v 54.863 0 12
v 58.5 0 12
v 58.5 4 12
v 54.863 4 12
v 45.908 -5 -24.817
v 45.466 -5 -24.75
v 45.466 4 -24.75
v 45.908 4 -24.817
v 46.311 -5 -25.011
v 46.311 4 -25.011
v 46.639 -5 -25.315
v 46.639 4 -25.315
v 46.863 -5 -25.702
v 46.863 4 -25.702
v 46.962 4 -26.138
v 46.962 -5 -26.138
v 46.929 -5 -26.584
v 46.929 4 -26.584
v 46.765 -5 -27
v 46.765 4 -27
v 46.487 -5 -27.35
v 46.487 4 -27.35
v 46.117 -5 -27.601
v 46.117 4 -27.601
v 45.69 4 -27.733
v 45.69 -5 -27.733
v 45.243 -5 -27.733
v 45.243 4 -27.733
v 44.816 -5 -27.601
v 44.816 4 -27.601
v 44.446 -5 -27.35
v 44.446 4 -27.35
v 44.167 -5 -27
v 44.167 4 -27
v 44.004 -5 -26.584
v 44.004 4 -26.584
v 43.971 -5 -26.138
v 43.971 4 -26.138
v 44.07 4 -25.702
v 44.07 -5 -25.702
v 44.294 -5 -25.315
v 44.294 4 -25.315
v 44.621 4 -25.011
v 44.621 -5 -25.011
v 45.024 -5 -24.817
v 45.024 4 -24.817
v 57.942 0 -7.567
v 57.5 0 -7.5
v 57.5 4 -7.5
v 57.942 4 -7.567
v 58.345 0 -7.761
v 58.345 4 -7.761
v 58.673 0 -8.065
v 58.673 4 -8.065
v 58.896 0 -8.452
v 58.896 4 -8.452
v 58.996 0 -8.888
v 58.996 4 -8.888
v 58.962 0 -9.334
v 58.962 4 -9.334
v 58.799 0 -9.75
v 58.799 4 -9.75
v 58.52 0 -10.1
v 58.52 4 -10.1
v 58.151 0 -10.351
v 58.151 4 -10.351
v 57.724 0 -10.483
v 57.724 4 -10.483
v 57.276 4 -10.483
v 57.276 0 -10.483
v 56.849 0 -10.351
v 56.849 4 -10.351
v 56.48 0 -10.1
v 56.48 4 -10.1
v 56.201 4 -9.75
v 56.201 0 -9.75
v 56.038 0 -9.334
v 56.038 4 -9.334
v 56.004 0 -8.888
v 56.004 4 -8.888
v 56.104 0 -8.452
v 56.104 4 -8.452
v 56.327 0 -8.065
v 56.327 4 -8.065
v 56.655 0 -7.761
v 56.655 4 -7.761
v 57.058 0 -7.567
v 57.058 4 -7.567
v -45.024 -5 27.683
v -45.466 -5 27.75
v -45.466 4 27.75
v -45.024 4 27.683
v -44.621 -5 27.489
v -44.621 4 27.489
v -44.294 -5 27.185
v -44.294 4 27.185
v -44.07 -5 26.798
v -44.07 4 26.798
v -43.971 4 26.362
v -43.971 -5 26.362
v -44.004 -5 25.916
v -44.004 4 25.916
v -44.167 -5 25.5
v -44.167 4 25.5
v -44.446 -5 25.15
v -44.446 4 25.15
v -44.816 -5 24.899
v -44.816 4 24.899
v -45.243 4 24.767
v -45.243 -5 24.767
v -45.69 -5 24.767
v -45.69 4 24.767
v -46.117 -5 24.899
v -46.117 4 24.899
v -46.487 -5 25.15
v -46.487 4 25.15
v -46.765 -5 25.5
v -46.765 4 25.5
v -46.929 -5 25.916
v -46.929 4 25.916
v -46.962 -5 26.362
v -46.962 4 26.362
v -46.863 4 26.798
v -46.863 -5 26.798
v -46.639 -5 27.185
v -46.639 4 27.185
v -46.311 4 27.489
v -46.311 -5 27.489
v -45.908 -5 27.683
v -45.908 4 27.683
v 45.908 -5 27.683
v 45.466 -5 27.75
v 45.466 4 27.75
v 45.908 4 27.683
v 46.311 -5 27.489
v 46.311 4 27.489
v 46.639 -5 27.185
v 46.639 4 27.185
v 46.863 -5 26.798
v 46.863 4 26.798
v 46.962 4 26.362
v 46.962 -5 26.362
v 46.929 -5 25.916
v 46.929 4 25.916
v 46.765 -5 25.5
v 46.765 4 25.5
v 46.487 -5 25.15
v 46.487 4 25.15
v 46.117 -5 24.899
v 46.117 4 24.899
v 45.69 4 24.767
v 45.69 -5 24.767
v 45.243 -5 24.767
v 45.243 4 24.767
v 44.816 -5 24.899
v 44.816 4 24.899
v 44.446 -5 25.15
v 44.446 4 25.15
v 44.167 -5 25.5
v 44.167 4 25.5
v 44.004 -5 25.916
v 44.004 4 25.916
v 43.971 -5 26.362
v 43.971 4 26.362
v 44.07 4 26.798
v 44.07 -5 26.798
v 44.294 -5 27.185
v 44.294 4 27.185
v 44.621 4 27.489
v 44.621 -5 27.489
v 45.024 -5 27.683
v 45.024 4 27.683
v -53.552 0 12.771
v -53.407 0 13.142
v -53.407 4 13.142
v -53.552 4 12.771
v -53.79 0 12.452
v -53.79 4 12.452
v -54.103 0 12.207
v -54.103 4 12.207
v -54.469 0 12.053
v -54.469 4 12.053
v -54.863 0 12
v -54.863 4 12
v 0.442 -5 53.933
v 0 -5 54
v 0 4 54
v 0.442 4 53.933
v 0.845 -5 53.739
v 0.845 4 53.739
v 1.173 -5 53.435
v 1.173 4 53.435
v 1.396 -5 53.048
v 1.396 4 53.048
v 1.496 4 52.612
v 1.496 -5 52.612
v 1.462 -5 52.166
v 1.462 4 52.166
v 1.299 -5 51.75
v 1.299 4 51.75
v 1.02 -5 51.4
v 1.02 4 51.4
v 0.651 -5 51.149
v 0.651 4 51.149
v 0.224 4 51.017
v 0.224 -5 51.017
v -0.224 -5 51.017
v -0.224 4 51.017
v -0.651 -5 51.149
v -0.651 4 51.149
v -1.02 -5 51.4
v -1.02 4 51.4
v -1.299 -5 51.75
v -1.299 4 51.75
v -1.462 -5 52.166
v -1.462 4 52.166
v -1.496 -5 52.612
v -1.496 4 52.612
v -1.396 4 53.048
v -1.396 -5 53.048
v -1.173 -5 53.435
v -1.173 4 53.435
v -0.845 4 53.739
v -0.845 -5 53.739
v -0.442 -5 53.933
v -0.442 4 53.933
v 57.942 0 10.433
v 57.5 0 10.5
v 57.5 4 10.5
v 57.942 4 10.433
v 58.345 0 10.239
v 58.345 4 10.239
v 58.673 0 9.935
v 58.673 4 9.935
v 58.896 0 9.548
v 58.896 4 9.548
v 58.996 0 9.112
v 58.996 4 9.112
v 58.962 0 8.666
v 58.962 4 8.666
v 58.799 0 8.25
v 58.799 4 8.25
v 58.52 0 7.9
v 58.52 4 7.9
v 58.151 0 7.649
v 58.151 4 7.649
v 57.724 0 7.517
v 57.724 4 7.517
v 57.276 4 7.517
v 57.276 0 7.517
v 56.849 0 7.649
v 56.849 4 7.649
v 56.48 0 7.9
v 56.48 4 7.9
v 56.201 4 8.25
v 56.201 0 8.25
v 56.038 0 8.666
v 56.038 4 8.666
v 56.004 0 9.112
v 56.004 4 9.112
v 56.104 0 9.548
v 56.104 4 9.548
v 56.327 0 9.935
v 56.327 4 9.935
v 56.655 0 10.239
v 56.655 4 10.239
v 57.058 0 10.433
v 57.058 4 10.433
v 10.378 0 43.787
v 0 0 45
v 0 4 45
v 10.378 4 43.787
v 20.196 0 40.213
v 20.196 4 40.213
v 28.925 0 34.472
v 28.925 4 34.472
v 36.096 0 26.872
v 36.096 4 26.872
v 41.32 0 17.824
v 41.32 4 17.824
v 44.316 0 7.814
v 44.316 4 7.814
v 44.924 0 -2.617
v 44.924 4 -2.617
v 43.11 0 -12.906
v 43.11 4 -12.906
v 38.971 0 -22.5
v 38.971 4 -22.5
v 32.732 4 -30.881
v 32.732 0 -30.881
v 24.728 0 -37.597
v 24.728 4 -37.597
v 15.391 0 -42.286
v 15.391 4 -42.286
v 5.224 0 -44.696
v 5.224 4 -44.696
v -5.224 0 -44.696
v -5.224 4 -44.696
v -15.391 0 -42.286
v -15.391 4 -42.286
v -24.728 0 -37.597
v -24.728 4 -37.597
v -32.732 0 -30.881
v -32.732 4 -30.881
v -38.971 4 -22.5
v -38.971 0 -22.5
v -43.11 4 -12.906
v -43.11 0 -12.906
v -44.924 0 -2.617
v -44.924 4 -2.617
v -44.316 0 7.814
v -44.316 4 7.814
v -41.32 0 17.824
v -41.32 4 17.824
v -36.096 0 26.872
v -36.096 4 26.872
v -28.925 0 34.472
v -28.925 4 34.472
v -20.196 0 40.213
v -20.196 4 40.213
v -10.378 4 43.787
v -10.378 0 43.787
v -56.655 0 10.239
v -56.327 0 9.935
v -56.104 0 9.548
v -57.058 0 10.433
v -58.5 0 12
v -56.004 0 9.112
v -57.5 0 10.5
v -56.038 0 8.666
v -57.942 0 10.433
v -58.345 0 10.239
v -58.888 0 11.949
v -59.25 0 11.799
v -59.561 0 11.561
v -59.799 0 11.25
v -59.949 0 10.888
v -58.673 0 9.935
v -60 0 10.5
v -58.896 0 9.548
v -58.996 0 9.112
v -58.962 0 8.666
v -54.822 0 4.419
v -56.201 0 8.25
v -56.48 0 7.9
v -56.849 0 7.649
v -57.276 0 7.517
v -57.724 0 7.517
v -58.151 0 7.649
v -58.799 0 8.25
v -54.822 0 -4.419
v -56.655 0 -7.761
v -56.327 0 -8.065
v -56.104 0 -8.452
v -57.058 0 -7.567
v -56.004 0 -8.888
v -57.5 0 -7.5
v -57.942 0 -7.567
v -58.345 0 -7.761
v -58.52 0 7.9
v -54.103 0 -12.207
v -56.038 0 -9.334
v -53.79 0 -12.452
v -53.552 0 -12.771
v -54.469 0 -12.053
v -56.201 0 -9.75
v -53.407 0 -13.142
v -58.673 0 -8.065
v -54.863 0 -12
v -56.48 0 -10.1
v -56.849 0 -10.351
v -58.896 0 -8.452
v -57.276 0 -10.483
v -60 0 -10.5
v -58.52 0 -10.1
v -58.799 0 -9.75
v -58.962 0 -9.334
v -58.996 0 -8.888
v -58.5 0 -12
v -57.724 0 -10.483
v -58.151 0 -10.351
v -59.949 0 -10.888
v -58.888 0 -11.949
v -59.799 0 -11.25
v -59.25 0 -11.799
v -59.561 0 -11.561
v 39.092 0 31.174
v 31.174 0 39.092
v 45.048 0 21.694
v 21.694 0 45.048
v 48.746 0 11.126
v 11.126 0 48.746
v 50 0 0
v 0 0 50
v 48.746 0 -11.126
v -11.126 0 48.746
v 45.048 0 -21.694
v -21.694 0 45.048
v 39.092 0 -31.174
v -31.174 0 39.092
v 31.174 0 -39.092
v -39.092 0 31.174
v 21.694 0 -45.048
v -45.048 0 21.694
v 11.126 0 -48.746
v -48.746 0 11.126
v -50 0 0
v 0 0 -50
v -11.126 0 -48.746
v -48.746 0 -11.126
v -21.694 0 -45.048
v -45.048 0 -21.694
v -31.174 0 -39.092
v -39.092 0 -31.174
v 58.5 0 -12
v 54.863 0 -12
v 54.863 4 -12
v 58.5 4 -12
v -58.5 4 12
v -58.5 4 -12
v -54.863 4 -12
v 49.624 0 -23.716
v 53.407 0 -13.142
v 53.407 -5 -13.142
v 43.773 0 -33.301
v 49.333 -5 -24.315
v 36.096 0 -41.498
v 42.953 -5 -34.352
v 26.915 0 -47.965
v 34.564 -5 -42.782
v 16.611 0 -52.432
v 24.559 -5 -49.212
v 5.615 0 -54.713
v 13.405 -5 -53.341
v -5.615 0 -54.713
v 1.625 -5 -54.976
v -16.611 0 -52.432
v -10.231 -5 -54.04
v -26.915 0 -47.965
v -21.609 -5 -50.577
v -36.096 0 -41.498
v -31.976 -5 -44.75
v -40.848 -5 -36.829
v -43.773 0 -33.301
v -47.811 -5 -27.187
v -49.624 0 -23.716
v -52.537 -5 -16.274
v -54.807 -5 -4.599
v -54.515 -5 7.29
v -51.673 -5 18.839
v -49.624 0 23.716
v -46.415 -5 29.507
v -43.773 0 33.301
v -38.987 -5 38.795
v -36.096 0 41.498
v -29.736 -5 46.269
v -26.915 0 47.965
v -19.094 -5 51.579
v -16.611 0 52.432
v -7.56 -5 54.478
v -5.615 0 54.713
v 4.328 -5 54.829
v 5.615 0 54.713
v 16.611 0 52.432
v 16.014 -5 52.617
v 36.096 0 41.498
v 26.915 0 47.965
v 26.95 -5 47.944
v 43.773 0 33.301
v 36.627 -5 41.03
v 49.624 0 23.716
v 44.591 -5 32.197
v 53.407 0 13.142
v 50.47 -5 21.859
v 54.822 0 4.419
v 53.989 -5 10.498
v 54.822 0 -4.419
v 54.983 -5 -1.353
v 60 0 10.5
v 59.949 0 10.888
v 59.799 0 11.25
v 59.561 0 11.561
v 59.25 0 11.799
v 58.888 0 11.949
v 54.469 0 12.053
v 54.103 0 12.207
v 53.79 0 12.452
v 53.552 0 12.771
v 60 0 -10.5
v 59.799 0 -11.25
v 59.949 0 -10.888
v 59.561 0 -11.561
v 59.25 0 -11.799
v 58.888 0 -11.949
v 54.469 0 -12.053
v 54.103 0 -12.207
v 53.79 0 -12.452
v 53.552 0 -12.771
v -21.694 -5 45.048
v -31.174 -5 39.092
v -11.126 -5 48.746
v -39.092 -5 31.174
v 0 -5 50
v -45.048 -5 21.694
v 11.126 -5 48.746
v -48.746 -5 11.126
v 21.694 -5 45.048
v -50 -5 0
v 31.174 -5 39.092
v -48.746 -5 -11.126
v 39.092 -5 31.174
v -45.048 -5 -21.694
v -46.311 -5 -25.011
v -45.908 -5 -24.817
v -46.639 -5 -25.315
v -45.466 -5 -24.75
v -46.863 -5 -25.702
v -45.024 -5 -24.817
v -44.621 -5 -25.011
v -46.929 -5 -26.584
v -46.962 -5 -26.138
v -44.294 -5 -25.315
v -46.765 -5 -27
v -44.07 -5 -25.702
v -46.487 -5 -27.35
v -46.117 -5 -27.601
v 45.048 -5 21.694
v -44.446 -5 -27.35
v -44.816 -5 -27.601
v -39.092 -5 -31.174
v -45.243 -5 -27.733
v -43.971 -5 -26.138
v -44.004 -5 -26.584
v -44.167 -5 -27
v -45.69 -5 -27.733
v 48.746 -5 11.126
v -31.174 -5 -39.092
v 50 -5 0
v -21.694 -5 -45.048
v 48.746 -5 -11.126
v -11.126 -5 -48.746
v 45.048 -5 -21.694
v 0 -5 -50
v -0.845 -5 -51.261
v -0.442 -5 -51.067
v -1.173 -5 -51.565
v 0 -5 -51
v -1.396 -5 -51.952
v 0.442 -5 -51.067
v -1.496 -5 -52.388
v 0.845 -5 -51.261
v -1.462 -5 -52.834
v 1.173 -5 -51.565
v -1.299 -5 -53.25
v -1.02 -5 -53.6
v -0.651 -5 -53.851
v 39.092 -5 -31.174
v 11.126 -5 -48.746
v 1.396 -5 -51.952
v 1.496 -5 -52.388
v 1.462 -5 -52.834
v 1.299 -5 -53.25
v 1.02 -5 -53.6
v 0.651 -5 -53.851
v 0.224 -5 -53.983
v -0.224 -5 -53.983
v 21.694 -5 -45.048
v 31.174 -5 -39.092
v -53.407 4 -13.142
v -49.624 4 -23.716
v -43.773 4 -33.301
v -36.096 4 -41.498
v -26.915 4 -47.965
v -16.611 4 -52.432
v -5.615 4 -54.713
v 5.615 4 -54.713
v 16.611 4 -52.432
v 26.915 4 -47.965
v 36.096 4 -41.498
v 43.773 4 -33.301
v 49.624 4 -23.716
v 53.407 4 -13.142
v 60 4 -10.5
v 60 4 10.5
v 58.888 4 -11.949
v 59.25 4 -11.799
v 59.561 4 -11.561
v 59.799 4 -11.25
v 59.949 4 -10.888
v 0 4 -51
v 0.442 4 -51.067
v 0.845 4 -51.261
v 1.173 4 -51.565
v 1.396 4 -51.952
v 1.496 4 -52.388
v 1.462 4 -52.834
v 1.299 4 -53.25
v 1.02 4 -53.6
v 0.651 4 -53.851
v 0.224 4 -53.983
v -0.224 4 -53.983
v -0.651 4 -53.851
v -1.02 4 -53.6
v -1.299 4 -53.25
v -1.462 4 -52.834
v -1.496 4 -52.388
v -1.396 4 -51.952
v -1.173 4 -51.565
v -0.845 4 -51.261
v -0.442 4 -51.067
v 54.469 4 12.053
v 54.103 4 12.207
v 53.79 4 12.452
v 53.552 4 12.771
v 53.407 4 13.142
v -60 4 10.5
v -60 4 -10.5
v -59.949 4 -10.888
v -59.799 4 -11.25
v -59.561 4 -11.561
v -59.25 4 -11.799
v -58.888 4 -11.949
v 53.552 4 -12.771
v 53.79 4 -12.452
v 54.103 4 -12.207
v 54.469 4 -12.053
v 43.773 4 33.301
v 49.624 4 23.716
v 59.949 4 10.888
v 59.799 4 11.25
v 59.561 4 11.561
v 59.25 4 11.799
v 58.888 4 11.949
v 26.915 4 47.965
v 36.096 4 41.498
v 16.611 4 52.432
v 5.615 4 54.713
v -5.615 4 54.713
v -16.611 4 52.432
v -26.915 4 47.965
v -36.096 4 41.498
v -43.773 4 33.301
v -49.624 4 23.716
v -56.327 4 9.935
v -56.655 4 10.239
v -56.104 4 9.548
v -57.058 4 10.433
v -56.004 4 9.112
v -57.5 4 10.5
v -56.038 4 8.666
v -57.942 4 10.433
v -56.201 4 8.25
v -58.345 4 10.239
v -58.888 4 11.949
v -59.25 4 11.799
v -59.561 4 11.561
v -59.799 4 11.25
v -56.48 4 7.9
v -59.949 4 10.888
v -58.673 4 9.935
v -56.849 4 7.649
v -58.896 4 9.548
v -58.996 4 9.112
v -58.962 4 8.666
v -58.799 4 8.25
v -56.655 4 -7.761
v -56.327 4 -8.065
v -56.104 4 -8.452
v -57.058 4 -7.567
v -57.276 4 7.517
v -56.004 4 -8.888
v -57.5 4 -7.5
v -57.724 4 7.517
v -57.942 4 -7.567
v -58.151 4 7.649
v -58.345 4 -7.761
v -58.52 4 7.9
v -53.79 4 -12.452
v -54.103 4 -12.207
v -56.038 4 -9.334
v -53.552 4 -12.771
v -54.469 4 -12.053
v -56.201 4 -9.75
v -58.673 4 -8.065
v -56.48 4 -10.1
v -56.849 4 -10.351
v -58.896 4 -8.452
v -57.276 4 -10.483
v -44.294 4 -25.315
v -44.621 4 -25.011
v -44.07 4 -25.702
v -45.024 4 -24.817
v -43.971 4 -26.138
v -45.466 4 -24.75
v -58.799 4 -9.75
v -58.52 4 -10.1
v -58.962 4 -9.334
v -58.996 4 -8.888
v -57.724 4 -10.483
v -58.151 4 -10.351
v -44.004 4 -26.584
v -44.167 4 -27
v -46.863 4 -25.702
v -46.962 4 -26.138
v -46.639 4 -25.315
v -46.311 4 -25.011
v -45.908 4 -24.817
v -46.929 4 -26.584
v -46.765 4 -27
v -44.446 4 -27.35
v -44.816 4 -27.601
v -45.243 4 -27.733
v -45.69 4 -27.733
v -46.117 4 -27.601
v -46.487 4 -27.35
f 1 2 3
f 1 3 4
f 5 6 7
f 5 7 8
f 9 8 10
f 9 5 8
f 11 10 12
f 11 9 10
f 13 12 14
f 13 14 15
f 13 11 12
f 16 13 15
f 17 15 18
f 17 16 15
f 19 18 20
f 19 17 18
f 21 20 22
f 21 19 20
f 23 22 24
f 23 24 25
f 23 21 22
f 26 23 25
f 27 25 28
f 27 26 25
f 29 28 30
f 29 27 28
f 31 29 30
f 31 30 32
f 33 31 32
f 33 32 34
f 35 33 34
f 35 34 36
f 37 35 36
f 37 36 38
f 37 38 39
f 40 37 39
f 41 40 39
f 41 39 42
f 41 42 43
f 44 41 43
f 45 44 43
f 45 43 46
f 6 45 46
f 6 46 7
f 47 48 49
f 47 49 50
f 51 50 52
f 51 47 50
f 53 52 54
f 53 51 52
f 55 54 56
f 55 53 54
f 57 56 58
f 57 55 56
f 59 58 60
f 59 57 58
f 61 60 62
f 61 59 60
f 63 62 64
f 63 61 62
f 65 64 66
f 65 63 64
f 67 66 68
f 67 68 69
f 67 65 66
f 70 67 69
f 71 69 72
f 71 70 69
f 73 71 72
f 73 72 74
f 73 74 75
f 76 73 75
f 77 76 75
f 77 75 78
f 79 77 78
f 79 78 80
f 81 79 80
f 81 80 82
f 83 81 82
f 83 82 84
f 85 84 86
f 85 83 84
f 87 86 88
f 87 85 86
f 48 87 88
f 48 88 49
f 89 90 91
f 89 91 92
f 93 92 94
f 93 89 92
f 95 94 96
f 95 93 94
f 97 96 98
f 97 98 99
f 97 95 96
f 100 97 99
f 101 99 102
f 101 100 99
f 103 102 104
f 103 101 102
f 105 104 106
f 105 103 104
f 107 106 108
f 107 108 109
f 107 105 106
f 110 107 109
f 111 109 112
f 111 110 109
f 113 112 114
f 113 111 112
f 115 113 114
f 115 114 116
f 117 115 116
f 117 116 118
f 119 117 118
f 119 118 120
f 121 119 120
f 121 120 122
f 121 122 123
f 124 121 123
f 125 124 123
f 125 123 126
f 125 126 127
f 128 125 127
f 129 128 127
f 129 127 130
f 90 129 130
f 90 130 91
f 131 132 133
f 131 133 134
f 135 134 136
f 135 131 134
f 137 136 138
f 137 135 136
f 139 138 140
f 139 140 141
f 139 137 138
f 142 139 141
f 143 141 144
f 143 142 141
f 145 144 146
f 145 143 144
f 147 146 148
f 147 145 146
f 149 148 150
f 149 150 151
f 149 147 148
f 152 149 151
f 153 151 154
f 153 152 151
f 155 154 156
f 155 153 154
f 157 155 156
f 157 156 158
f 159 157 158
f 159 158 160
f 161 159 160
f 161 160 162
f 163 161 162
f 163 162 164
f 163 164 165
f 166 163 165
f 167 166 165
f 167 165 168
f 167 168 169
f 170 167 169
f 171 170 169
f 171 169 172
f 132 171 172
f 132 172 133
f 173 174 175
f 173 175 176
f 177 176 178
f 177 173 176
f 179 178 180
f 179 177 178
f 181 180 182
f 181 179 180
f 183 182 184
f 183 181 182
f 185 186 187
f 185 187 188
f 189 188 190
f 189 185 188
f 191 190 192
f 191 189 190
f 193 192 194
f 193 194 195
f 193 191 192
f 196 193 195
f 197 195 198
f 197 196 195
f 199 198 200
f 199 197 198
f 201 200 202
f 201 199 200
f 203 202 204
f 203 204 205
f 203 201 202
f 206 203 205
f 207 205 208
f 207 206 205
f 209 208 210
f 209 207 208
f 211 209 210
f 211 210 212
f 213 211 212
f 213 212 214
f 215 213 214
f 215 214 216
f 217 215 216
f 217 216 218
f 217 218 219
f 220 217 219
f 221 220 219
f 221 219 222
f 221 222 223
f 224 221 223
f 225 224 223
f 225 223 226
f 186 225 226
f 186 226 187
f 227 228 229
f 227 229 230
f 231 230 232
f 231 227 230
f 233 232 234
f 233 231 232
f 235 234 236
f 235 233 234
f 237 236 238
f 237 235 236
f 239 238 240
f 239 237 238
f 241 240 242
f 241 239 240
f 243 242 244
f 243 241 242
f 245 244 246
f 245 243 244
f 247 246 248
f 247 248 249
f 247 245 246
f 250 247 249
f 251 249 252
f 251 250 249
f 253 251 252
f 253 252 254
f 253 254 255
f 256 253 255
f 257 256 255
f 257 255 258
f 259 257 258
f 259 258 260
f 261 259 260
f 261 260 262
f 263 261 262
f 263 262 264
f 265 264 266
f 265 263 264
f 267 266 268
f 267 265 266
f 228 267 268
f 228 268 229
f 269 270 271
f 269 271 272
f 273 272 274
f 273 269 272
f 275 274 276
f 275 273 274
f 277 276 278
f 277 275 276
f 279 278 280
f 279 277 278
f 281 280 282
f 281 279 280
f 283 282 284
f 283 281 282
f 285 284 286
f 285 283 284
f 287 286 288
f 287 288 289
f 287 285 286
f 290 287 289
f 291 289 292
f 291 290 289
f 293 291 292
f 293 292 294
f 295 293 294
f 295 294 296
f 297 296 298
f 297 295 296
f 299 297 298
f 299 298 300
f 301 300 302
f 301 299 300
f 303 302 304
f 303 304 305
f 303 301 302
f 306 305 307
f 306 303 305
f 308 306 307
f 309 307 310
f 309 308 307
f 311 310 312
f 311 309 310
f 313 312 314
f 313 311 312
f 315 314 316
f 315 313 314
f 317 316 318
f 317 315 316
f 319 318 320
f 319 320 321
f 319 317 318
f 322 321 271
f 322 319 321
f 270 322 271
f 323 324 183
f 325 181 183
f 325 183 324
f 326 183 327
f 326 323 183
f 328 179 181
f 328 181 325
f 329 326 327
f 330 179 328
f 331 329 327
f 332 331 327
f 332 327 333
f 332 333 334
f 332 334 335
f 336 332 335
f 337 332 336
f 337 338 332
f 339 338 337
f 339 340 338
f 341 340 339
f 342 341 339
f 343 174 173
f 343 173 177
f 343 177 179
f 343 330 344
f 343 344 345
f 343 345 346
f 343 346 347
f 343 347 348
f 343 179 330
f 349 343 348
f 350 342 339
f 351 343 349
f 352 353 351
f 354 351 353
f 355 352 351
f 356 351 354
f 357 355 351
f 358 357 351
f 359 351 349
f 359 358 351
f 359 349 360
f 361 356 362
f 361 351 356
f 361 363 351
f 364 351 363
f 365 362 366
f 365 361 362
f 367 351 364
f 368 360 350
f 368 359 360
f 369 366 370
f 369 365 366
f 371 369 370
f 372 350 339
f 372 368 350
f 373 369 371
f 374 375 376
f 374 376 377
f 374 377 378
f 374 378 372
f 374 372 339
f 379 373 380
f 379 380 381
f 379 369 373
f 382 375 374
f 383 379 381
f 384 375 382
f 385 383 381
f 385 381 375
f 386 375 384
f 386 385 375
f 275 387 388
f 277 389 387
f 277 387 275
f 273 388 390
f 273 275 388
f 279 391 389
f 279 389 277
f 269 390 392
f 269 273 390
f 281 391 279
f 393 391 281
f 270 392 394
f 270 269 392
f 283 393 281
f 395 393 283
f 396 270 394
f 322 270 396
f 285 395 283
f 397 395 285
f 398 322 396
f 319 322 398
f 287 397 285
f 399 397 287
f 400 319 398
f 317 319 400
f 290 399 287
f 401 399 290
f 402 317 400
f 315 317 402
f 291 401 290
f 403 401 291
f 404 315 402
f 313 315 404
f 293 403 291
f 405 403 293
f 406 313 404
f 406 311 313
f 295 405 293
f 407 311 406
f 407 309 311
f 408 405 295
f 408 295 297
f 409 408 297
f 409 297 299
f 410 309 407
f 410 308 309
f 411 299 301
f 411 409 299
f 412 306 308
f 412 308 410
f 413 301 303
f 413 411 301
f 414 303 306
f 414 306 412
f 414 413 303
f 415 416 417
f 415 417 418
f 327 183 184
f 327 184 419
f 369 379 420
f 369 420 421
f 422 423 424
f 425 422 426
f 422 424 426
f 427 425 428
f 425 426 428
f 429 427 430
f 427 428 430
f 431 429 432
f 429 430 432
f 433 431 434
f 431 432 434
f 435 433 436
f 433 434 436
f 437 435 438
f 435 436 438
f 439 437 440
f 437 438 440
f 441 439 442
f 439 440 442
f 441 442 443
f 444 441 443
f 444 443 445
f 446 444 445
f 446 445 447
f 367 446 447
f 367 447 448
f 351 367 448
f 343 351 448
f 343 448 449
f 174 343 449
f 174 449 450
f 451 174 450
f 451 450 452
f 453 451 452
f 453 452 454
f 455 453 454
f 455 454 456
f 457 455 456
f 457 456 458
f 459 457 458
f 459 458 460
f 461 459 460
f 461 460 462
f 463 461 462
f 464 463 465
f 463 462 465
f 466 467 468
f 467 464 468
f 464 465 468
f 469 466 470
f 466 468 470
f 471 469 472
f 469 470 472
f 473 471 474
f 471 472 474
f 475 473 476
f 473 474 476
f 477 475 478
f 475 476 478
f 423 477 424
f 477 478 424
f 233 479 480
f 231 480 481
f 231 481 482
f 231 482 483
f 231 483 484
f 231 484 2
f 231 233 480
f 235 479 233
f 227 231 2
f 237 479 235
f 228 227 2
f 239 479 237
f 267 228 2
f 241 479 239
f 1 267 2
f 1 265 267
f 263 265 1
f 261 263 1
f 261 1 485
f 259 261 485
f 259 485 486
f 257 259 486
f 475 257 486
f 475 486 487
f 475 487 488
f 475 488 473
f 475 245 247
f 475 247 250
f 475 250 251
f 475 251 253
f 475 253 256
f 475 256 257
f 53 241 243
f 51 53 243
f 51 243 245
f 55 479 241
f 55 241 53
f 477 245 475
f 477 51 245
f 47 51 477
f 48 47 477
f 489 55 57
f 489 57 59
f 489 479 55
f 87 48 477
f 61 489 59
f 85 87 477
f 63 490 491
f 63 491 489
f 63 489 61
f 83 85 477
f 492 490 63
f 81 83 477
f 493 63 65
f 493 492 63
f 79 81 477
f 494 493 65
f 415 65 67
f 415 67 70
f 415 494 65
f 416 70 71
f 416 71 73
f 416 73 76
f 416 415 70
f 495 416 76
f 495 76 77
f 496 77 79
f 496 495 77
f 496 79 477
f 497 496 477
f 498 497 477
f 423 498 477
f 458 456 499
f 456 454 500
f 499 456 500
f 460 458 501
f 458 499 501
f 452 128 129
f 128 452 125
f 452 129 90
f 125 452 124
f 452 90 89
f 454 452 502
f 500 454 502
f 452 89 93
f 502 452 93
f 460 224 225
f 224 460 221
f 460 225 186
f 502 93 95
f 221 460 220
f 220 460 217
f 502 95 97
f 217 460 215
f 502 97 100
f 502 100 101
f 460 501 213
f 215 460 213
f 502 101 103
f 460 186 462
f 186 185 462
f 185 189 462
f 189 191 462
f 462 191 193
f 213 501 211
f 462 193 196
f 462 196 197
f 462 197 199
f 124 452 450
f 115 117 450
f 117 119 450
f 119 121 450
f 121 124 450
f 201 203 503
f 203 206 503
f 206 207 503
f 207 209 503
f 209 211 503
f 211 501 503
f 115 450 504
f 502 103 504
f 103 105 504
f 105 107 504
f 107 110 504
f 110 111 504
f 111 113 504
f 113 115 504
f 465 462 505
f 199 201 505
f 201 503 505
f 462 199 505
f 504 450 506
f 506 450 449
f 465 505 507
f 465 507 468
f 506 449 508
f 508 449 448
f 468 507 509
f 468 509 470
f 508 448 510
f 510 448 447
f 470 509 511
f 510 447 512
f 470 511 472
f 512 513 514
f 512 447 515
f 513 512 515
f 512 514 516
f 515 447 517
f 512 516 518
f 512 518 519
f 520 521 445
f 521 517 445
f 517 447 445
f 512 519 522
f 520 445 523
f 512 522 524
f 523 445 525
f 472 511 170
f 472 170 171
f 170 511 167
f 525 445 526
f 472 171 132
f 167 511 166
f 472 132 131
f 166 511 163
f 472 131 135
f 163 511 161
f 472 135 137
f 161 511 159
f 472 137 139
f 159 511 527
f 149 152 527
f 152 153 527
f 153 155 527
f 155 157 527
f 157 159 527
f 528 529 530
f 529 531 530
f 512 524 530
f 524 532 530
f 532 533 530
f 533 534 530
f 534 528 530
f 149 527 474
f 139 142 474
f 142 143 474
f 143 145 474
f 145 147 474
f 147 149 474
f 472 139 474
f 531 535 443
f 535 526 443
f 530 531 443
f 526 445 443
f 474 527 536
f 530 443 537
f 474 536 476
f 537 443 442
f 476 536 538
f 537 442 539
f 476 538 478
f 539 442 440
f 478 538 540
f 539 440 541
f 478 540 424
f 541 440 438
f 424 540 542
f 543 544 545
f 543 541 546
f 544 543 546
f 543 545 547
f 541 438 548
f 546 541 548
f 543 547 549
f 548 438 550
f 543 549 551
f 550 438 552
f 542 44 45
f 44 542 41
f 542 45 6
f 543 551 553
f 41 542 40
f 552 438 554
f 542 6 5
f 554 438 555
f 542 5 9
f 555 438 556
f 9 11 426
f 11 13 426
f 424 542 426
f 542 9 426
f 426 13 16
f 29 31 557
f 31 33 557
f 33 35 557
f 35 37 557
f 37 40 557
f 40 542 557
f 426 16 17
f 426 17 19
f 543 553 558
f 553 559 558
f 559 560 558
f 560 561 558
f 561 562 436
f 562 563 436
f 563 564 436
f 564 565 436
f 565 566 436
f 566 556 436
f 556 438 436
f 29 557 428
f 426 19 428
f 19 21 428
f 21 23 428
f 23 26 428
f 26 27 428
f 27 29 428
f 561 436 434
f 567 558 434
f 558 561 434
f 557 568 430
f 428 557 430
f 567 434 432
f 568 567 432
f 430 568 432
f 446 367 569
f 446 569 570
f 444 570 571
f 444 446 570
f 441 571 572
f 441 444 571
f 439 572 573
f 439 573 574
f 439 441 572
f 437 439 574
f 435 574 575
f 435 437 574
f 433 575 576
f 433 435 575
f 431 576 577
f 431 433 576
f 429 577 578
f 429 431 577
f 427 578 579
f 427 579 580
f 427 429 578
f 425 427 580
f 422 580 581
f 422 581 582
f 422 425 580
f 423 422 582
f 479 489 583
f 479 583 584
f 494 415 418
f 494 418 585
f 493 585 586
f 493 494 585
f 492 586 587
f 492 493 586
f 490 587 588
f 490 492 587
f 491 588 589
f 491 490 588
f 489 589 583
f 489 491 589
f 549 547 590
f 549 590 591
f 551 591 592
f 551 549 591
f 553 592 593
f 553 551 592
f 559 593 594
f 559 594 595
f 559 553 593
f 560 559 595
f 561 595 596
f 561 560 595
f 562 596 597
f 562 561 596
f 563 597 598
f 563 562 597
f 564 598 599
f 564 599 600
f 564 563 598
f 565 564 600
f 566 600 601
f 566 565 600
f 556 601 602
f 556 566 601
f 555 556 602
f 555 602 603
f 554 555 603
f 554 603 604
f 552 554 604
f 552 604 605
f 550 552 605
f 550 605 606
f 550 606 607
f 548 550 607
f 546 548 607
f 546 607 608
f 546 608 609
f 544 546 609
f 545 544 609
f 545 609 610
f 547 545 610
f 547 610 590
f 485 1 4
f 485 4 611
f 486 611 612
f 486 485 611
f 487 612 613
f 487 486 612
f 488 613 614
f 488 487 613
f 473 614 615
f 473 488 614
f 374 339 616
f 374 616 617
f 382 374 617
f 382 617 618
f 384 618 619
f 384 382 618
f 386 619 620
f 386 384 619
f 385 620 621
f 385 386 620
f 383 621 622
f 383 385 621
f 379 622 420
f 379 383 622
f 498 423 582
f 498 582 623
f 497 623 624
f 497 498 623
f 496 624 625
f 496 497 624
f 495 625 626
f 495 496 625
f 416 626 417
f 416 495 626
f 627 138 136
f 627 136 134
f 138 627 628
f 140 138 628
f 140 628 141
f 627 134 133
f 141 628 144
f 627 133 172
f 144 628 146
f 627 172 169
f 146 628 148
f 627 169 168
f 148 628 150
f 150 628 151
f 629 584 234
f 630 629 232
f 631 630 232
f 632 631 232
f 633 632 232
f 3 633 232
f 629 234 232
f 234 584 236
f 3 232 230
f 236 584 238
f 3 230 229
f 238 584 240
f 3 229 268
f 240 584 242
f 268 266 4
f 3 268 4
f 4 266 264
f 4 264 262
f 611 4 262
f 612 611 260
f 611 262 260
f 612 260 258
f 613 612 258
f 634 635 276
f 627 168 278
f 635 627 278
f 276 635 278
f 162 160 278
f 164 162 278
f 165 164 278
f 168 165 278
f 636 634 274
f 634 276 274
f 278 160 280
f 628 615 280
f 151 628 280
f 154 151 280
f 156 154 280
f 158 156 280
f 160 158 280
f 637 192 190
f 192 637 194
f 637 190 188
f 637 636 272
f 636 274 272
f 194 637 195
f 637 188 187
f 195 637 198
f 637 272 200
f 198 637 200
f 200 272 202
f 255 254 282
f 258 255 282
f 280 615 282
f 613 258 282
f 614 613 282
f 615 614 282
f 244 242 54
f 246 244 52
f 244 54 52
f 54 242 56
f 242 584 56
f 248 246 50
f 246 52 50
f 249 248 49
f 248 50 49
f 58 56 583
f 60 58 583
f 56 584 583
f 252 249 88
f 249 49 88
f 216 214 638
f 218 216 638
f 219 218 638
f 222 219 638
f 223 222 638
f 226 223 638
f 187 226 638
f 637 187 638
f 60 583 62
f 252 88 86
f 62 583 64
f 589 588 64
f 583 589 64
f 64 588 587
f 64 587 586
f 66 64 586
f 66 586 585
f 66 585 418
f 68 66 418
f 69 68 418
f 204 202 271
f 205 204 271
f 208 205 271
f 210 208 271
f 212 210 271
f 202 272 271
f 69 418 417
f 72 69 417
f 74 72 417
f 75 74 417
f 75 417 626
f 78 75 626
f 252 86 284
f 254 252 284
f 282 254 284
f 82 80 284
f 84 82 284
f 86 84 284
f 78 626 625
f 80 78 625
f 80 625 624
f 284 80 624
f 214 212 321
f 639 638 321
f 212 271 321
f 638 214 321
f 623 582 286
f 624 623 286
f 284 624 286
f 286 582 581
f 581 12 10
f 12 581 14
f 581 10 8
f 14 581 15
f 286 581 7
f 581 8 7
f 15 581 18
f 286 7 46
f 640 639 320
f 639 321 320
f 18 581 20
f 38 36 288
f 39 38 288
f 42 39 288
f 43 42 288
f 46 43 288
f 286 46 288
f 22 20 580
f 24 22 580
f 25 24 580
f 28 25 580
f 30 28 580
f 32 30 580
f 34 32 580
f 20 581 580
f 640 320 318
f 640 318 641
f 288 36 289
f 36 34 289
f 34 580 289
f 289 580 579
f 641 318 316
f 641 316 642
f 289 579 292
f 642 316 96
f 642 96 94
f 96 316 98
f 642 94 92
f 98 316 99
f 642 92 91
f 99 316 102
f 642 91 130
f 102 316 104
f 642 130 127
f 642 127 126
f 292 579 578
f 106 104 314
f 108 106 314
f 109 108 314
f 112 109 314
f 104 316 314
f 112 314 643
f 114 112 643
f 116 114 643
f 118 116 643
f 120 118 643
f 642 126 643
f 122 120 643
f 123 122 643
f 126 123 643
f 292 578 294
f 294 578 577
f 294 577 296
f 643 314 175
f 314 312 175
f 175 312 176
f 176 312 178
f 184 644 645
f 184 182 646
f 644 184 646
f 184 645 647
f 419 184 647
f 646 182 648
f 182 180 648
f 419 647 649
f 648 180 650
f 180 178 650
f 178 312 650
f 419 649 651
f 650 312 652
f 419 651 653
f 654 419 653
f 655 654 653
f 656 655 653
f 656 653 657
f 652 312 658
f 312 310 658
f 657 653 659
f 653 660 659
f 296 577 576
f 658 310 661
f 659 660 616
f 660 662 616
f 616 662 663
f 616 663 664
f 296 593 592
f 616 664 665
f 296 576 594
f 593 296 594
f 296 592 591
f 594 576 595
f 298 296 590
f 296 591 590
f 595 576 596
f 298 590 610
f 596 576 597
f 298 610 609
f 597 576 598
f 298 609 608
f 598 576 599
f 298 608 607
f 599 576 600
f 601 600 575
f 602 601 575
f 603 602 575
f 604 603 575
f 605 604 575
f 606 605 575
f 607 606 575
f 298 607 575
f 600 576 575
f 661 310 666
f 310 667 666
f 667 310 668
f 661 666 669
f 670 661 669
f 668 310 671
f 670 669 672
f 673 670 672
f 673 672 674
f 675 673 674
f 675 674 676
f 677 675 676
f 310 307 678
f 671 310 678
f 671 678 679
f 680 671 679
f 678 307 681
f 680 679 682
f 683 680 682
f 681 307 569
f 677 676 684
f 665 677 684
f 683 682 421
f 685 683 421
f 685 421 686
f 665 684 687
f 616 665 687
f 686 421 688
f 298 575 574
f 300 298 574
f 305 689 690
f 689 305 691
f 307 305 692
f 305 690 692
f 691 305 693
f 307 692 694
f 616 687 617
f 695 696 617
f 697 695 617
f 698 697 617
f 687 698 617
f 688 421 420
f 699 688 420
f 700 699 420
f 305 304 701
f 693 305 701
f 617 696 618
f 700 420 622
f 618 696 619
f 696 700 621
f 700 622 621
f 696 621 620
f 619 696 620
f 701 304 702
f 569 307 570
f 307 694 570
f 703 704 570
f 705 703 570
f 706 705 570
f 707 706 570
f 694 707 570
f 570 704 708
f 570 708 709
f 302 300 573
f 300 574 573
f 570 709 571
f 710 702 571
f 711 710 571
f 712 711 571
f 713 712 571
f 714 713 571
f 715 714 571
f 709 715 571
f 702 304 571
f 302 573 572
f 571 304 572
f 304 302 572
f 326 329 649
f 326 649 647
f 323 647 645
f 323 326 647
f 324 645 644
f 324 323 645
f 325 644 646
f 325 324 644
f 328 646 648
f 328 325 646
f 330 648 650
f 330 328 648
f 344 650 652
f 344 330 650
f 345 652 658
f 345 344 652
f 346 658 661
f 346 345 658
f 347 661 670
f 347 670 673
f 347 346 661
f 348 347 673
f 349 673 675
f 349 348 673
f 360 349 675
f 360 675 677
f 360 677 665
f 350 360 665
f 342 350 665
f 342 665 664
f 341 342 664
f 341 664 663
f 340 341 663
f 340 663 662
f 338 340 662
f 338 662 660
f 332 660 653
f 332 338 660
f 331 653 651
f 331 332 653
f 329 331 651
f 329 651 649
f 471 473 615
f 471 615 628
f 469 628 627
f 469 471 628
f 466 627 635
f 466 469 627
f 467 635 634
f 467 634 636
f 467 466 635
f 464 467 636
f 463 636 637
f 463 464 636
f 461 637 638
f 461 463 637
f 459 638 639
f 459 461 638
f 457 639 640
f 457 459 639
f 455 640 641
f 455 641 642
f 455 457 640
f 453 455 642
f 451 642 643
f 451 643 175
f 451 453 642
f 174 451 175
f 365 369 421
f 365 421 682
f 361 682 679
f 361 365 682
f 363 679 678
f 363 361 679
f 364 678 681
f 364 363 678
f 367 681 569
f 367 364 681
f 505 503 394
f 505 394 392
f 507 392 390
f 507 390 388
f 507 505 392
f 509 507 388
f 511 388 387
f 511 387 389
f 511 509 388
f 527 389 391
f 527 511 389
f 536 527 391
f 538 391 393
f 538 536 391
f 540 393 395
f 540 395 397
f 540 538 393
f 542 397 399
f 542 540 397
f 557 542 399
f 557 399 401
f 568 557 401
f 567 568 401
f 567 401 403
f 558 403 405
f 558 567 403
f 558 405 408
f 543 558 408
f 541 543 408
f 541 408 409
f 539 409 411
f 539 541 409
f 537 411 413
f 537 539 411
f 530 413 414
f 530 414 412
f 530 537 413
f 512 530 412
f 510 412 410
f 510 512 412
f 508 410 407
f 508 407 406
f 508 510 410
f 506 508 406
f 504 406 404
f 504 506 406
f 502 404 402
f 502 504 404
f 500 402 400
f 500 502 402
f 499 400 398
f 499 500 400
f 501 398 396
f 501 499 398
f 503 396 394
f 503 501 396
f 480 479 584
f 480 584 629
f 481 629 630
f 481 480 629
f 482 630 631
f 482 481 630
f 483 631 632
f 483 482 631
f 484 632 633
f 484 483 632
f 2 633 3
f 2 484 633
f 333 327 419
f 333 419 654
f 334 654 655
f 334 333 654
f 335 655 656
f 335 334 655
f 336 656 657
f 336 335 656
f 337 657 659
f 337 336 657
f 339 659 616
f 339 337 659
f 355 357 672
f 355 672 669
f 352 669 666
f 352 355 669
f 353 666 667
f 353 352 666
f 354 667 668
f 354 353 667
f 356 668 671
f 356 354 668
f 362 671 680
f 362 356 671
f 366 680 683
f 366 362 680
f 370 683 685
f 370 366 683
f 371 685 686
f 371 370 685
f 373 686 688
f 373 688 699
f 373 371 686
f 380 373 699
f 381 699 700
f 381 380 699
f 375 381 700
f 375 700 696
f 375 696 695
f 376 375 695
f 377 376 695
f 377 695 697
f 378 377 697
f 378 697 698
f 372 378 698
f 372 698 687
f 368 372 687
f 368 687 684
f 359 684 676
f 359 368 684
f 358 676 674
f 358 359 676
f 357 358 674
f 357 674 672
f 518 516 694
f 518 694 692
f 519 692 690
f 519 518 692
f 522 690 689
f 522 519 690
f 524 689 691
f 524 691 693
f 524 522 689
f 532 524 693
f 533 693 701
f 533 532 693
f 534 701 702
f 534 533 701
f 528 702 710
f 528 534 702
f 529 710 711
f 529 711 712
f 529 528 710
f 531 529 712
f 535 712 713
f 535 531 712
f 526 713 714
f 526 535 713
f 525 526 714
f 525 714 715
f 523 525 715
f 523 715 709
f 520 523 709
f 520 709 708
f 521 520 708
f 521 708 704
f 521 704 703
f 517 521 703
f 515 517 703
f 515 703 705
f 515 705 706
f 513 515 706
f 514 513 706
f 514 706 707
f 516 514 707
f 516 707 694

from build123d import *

# Parameters (mm, degrees)
SKETCH_1_R      = 1.5
SKETCH_1_R_2    = 45
EXTRUDE_1_DEPTH = 4
EXTRUDE_START   = -5
SKETCH_2_R      = 55
SKETCH_2_R_2    = 1.5
SKETCH_2_R_3    = 50
EXTRUDE_2_DEPTH = 5


with BuildPart() as part:
    # 草图1 → 凸台-拉伸1 (new body)
    with BuildSketch(Plane(origin=(0, 0, 0), x_dir=(1, 0, 0), z_dir=(0, 1, 0))):
        with BuildLine():
            ThreePointArc((-54.863466897, 12), (-53.938159008, 12.31940468), (-53.406914679, 13.14159292))
            ThreePointArc((-53.406914679, 13.14159292), (0, 55), (53.406914679, 13.14159292))
            ThreePointArc((53.406914679, 13.14159292), (53.938159008, 12.31940468), (54.863466897, 12))
            Line((54.863466897, 12), (58.5, 12))
            ThreePointArc((58.5, 12), (59.560660172, 11.560660172), (60, 10.5))
            Line((60, 10.5), (60, -10.5))
            ThreePointArc((60, -10.5), (59.560660172, -11.560660172), (58.5, -12))
            Line((58.5, -12), (54.863466897, -12))
            ThreePointArc((54.863466897, -12), (53.938159008, -12.31940468), (53.406914679, -13.14159292))
            ThreePointArc((53.406914679, -13.14159292), (0, -55), (-53.406914679, -13.14159292))
            ThreePointArc((-53.406914679, -13.14159292), (-53.938159008, -12.31940468), (-54.863466897, -12))
            Line((-54.863466897, -12), (-58.5, -12))
            ThreePointArc((-58.5, -12), (-59.560660172, -11.560660172), (-60, -10.5))
            Line((-60, -10.5), (-60, 10.5))
            ThreePointArc((-60, 10.5), (-59.560660172, 11.560660172), (-58.5, 12))
            Line((-58.5, 12), (-54.863466897, 12))
        make_face()
        with Locations(Location((-45.466333699, 26.25, 0), (0, 0, 270))):
            Circle(SKETCH_1_R, mode=Mode.SUBTRACT)
        with Locations(Location((-45.466333699, -26.25, 0), (0, 0, 270))):
            Circle(SKETCH_1_R, mode=Mode.SUBTRACT)
        with Locations(Location((0, -52.5, 0), (0, 0, 270))):
            Circle(SKETCH_1_R, mode=Mode.SUBTRACT)
        with Locations(Location((45.466333699, -26.25, 0), (0, 0, 270))):
            Circle(SKETCH_1_R, mode=Mode.SUBTRACT)
        with Locations(Location((45.466333699, 26.25, 0), (0, 0, 270))):
            Circle(SKETCH_1_R, mode=Mode.SUBTRACT)
        with Locations(Location((0, 52.5, 0), (0, 0, 270))):
            Circle(SKETCH_1_R, mode=Mode.SUBTRACT)
        with Locations(Location((57.5, 9, 0), (0, 0, 270))):
            Circle(SKETCH_1_R, mode=Mode.SUBTRACT)
        with Locations(Location((-57.5, -9, 0), (0, 0, 270))):
            Circle(SKETCH_1_R, mode=Mode.SUBTRACT)
        with Locations(Location((-57.5, 9, 0), (0, 0, 270))):
            Circle(SKETCH_1_R, mode=Mode.SUBTRACT)
        with Locations(Location((0, 0, 0), (0, 0, 270))):
            Circle(SKETCH_1_R_2, mode=Mode.SUBTRACT)
        with Locations(Location((57.5, -9, 0), (0, 0, 270))):
            Circle(SKETCH_1_R, mode=Mode.SUBTRACT)
    extrude(amount=EXTRUDE_1_DEPTH)

    # 草图2 → 凸台-拉伸2 (add)
    with BuildSketch(Plane(origin=(0, 0, 0), x_dir=(1, 0, 0), z_dir=(0, 1, 0)).offset(EXTRUDE_START)):
        with Locations(Location((0, 0, 0), (0, 0, 13.823871882))):
            Circle(SKETCH_2_R)
        with Locations(Location((-45.466333699, 26.25, 0), (0, 0, 270))):
            Circle(SKETCH_2_R_2, mode=Mode.SUBTRACT)
        with Locations(Location((-45.466333699, -26.25, 0), (0, 0, 270))):
            Circle(SKETCH_2_R_2, mode=Mode.SUBTRACT)
        with Locations(Location((0, -52.5, 0), (0, 0, 270))):
            Circle(SKETCH_2_R_2, mode=Mode.SUBTRACT)
        with Locations(Location((45.466333699, -26.25, 0), (0, 0, 270))):
            Circle(SKETCH_2_R_2, mode=Mode.SUBTRACT)
        with Locations(Location((45.466333699, 26.25, 0), (0, 0, 270))):
            Circle(SKETCH_2_R_2, mode=Mode.SUBTRACT)
        with Locations(Location((0, 52.5, 0), (0, 0, 270))):
            Circle(SKETCH_2_R_2, mode=Mode.SUBTRACT)
        with Locations(Location((0, 0, 0), (0, 0, 270))):
            Circle(SKETCH_2_R_3, mode=Mode.SUBTRACT)
    extrude(amount=EXTRUDE_2_DEPTH)


solid = part.part
